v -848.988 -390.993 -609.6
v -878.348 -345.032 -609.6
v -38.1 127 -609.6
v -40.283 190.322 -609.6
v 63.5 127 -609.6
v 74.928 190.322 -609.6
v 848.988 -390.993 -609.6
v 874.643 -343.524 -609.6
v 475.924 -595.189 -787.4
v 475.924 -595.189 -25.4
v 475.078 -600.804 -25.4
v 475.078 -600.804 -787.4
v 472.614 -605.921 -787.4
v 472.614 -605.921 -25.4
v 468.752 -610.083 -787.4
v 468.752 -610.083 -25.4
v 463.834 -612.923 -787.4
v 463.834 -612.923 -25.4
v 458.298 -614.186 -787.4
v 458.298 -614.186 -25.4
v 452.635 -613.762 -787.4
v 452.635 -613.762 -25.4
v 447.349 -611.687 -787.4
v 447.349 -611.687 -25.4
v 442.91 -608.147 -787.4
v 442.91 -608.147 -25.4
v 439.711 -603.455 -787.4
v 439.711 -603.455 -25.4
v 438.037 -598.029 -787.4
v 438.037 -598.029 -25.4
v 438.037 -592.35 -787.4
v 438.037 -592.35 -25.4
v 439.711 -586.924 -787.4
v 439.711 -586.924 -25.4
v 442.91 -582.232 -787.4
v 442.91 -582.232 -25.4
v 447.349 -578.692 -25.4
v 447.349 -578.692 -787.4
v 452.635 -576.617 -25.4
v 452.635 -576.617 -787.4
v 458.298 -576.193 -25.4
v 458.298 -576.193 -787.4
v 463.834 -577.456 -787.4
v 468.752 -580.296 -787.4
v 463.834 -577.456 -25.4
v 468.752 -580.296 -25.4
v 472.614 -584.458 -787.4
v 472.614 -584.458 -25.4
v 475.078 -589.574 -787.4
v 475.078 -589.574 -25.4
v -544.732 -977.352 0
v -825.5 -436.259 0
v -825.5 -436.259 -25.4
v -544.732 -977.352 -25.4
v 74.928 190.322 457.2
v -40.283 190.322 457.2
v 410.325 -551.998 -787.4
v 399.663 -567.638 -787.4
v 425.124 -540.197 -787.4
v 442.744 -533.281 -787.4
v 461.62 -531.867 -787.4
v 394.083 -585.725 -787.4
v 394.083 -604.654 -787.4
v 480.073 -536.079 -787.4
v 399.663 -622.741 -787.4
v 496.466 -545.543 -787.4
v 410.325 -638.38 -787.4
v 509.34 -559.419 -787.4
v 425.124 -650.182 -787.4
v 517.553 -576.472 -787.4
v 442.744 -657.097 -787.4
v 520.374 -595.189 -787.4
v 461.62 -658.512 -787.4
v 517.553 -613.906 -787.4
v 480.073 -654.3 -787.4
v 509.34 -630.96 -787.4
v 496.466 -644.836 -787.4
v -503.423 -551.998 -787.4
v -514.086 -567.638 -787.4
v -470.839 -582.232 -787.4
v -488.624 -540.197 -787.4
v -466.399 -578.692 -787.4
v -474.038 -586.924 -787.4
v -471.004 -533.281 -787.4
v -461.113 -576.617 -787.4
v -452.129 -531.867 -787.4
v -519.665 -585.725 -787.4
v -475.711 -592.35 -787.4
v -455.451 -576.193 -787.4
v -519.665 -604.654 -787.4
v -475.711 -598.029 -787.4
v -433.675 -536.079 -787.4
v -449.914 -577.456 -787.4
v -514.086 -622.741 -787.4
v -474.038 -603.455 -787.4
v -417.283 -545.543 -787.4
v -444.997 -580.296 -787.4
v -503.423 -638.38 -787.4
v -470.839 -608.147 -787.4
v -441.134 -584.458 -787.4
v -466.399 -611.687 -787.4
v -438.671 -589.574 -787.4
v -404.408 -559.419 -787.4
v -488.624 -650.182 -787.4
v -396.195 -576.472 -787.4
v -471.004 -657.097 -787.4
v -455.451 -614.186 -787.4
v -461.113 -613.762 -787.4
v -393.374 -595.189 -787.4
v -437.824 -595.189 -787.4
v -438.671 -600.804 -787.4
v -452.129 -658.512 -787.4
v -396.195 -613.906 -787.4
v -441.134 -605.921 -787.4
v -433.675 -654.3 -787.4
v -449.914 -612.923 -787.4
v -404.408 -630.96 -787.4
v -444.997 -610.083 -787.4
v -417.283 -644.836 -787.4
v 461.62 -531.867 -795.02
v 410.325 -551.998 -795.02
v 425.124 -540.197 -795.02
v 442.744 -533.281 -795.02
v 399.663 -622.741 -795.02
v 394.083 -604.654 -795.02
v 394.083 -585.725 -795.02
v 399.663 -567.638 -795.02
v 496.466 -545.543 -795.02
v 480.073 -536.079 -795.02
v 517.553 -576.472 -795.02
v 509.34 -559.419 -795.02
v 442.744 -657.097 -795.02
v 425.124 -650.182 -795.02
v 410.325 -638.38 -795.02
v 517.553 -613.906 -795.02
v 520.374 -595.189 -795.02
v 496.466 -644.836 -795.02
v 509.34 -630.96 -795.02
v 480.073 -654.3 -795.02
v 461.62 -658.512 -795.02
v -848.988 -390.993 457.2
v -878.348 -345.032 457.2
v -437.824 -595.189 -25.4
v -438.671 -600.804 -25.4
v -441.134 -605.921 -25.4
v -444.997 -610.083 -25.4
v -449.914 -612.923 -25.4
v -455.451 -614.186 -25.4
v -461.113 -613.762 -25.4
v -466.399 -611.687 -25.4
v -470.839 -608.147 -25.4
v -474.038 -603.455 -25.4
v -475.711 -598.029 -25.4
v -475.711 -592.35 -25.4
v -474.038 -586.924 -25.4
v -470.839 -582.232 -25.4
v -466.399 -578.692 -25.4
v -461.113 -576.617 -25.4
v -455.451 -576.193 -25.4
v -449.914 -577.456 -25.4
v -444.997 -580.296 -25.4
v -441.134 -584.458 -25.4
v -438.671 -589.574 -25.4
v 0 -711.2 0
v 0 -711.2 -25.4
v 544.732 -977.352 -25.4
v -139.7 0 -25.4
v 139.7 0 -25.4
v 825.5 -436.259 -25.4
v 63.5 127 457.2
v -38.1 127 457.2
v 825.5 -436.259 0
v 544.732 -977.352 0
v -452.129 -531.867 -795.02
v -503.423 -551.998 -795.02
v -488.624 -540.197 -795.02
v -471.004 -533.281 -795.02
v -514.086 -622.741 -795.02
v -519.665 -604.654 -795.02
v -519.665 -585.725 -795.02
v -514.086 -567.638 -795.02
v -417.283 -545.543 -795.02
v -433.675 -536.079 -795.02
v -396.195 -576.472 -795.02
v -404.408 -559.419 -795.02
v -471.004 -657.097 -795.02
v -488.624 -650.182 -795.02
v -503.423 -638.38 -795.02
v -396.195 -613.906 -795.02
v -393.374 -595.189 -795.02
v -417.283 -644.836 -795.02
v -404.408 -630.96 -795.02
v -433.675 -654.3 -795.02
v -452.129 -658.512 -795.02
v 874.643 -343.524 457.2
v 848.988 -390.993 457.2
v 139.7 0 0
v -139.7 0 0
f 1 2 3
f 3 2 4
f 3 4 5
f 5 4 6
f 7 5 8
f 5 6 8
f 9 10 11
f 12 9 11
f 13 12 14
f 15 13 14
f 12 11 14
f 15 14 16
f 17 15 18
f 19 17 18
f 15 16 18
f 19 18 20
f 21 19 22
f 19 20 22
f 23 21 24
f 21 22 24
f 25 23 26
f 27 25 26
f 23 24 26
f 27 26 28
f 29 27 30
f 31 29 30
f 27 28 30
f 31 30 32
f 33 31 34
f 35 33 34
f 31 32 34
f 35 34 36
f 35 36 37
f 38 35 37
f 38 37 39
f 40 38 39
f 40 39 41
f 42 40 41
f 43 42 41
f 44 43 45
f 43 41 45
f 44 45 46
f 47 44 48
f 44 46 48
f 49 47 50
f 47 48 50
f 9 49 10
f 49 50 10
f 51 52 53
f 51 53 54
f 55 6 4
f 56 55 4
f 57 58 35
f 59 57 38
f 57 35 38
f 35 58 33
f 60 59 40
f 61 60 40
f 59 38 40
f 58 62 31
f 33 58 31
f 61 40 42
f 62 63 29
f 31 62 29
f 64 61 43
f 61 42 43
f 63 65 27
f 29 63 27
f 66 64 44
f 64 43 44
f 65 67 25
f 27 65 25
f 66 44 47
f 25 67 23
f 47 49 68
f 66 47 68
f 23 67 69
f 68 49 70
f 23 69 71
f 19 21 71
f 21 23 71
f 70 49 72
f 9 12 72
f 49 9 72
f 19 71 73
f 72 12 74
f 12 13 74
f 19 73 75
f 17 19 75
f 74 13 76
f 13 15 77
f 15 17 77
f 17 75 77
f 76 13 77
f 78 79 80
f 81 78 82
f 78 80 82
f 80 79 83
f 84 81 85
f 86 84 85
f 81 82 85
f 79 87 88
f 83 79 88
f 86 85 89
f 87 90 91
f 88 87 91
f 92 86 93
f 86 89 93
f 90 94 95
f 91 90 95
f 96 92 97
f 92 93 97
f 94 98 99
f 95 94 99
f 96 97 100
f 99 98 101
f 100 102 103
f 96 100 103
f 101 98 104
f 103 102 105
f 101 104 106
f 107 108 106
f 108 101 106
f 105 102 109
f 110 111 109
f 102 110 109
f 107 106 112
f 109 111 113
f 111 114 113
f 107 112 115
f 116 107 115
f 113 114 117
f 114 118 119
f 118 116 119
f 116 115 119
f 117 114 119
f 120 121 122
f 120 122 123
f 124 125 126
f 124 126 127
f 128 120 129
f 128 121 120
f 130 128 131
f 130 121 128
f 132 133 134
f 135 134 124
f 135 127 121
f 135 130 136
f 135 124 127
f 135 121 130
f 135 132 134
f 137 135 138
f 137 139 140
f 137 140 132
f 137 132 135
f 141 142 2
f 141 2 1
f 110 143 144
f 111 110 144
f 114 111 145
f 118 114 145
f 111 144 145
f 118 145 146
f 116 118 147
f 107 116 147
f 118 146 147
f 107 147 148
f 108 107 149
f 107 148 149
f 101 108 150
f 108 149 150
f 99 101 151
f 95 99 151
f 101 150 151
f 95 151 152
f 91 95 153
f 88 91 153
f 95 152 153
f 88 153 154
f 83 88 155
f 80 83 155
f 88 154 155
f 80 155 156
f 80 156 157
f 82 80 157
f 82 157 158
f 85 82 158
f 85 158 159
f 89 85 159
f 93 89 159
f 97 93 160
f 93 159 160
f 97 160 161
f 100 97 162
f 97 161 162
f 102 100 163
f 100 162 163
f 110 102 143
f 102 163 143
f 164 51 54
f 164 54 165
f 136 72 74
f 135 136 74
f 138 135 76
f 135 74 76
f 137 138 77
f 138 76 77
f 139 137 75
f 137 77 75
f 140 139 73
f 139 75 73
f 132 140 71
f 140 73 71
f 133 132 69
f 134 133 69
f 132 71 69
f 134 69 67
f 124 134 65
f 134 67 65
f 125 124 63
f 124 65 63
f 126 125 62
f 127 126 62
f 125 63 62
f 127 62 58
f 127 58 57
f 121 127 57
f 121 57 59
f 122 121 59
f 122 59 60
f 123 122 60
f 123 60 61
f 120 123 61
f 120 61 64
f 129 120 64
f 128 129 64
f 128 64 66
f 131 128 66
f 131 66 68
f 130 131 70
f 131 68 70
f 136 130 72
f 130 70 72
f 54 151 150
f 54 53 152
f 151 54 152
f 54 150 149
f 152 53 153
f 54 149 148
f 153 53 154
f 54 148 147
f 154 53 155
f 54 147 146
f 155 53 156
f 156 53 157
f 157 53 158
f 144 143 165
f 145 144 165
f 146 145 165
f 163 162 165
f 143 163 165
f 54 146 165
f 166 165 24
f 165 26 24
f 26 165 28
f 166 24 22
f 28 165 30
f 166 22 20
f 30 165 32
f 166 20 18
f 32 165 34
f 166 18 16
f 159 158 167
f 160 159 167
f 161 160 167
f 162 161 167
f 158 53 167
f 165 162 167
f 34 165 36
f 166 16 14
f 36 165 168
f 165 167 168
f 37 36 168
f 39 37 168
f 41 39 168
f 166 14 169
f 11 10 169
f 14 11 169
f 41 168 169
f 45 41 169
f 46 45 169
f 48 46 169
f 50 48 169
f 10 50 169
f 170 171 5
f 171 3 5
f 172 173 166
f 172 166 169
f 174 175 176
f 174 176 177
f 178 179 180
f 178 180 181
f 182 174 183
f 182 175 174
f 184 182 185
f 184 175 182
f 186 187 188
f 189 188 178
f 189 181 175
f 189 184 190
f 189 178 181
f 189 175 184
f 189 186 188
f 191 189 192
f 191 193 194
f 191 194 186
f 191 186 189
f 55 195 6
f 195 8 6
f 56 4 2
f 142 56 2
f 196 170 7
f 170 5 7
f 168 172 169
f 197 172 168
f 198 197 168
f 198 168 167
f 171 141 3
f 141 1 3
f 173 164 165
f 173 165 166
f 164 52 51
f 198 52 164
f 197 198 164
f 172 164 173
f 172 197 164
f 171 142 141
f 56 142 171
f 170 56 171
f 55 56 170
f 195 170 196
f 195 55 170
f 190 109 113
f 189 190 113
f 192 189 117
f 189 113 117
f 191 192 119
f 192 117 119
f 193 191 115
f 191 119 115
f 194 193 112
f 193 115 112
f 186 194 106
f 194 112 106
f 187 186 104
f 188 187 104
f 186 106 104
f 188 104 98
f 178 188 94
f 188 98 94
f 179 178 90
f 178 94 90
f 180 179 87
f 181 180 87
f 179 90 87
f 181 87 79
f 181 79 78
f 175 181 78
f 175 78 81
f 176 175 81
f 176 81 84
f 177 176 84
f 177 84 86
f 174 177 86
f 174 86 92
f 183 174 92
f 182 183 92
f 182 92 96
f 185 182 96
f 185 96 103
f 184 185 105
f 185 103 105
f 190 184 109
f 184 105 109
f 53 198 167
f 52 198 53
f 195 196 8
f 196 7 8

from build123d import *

# Parameters (mm, degrees)
F1_DEPTH = 25.4
F2_R     = 19.05
F3_DEPTH = 762
F4_R     = 63.5
F5_DEPTH = 7.62
F7_DEPTH = 609.6
F8_DEPTH = 457.2


with BuildPart() as f1:
    # F0 (on Top) → F1 (new body)
    with BuildSketch(Plane.XY):
        Polygon((139.7, 0), (-139.7, 0), (-825.5, -436.259327), (-544.732308, -977.352353), (0, -711.2), (544.732308, -977.352353), (825.5, -436.259327), align=None)
    extrude(amount=-F1_DEPTH)

    # F2 (on face) → F3 (join)
    with BuildSketch(Plane(origin=(0, 0, -25.4), x_dir=(1, 0, 0), z_dir=(0, 0, -1))):
        with Locations((-456.874231, 595.18941)):
            Circle(F2_R)
        with Locations((456.874231, 595.18941)):
            Circle(F2_R)
    extrude(amount=F3_DEPTH)

    # F4 (on face) → F5 (join)
    with BuildSketch(Plane(origin=(0, 0, -787.4), x_dir=(1, 0, 0), z_dir=(0, 0, -1))):
        with Locations((-456.874231, 595.18941)):
            Circle(F4_R)
        with Locations((456.874231, 595.18941)):
            Circle(F4_R)
    extrude(amount=F5_DEPTH)


with BuildPart() as f7:
    # F6 (on Top) → F7 (new body)
    with BuildSketch(Plane.XY):
        Polygon((-878.347972, -345.03215), (-848.988028, -390.993405), (-38.1, 127), (63.5, 127), (848.988028, -390.993405), (874.642551, -343.524218), (74.927829, 190.321905), (-40.282875, 190.321905), align=None)
    extrude(amount=-F7_DEPTH)

    # F6 (on Top) → F8 (join)
    with BuildSketch(Plane.XY):
        Polygon((-878.347972, -345.03215), (-848.988028, -390.993405), (-38.1, 127), (63.5, 127), (848.988028, -390.993405), (874.642551, -343.524218), (74.927829, 190.321905), (-40.282875, 190.321905), align=None)
    extrude(amount=F8_DEPTH)


solid = Compound([f1.part, f7.part])
